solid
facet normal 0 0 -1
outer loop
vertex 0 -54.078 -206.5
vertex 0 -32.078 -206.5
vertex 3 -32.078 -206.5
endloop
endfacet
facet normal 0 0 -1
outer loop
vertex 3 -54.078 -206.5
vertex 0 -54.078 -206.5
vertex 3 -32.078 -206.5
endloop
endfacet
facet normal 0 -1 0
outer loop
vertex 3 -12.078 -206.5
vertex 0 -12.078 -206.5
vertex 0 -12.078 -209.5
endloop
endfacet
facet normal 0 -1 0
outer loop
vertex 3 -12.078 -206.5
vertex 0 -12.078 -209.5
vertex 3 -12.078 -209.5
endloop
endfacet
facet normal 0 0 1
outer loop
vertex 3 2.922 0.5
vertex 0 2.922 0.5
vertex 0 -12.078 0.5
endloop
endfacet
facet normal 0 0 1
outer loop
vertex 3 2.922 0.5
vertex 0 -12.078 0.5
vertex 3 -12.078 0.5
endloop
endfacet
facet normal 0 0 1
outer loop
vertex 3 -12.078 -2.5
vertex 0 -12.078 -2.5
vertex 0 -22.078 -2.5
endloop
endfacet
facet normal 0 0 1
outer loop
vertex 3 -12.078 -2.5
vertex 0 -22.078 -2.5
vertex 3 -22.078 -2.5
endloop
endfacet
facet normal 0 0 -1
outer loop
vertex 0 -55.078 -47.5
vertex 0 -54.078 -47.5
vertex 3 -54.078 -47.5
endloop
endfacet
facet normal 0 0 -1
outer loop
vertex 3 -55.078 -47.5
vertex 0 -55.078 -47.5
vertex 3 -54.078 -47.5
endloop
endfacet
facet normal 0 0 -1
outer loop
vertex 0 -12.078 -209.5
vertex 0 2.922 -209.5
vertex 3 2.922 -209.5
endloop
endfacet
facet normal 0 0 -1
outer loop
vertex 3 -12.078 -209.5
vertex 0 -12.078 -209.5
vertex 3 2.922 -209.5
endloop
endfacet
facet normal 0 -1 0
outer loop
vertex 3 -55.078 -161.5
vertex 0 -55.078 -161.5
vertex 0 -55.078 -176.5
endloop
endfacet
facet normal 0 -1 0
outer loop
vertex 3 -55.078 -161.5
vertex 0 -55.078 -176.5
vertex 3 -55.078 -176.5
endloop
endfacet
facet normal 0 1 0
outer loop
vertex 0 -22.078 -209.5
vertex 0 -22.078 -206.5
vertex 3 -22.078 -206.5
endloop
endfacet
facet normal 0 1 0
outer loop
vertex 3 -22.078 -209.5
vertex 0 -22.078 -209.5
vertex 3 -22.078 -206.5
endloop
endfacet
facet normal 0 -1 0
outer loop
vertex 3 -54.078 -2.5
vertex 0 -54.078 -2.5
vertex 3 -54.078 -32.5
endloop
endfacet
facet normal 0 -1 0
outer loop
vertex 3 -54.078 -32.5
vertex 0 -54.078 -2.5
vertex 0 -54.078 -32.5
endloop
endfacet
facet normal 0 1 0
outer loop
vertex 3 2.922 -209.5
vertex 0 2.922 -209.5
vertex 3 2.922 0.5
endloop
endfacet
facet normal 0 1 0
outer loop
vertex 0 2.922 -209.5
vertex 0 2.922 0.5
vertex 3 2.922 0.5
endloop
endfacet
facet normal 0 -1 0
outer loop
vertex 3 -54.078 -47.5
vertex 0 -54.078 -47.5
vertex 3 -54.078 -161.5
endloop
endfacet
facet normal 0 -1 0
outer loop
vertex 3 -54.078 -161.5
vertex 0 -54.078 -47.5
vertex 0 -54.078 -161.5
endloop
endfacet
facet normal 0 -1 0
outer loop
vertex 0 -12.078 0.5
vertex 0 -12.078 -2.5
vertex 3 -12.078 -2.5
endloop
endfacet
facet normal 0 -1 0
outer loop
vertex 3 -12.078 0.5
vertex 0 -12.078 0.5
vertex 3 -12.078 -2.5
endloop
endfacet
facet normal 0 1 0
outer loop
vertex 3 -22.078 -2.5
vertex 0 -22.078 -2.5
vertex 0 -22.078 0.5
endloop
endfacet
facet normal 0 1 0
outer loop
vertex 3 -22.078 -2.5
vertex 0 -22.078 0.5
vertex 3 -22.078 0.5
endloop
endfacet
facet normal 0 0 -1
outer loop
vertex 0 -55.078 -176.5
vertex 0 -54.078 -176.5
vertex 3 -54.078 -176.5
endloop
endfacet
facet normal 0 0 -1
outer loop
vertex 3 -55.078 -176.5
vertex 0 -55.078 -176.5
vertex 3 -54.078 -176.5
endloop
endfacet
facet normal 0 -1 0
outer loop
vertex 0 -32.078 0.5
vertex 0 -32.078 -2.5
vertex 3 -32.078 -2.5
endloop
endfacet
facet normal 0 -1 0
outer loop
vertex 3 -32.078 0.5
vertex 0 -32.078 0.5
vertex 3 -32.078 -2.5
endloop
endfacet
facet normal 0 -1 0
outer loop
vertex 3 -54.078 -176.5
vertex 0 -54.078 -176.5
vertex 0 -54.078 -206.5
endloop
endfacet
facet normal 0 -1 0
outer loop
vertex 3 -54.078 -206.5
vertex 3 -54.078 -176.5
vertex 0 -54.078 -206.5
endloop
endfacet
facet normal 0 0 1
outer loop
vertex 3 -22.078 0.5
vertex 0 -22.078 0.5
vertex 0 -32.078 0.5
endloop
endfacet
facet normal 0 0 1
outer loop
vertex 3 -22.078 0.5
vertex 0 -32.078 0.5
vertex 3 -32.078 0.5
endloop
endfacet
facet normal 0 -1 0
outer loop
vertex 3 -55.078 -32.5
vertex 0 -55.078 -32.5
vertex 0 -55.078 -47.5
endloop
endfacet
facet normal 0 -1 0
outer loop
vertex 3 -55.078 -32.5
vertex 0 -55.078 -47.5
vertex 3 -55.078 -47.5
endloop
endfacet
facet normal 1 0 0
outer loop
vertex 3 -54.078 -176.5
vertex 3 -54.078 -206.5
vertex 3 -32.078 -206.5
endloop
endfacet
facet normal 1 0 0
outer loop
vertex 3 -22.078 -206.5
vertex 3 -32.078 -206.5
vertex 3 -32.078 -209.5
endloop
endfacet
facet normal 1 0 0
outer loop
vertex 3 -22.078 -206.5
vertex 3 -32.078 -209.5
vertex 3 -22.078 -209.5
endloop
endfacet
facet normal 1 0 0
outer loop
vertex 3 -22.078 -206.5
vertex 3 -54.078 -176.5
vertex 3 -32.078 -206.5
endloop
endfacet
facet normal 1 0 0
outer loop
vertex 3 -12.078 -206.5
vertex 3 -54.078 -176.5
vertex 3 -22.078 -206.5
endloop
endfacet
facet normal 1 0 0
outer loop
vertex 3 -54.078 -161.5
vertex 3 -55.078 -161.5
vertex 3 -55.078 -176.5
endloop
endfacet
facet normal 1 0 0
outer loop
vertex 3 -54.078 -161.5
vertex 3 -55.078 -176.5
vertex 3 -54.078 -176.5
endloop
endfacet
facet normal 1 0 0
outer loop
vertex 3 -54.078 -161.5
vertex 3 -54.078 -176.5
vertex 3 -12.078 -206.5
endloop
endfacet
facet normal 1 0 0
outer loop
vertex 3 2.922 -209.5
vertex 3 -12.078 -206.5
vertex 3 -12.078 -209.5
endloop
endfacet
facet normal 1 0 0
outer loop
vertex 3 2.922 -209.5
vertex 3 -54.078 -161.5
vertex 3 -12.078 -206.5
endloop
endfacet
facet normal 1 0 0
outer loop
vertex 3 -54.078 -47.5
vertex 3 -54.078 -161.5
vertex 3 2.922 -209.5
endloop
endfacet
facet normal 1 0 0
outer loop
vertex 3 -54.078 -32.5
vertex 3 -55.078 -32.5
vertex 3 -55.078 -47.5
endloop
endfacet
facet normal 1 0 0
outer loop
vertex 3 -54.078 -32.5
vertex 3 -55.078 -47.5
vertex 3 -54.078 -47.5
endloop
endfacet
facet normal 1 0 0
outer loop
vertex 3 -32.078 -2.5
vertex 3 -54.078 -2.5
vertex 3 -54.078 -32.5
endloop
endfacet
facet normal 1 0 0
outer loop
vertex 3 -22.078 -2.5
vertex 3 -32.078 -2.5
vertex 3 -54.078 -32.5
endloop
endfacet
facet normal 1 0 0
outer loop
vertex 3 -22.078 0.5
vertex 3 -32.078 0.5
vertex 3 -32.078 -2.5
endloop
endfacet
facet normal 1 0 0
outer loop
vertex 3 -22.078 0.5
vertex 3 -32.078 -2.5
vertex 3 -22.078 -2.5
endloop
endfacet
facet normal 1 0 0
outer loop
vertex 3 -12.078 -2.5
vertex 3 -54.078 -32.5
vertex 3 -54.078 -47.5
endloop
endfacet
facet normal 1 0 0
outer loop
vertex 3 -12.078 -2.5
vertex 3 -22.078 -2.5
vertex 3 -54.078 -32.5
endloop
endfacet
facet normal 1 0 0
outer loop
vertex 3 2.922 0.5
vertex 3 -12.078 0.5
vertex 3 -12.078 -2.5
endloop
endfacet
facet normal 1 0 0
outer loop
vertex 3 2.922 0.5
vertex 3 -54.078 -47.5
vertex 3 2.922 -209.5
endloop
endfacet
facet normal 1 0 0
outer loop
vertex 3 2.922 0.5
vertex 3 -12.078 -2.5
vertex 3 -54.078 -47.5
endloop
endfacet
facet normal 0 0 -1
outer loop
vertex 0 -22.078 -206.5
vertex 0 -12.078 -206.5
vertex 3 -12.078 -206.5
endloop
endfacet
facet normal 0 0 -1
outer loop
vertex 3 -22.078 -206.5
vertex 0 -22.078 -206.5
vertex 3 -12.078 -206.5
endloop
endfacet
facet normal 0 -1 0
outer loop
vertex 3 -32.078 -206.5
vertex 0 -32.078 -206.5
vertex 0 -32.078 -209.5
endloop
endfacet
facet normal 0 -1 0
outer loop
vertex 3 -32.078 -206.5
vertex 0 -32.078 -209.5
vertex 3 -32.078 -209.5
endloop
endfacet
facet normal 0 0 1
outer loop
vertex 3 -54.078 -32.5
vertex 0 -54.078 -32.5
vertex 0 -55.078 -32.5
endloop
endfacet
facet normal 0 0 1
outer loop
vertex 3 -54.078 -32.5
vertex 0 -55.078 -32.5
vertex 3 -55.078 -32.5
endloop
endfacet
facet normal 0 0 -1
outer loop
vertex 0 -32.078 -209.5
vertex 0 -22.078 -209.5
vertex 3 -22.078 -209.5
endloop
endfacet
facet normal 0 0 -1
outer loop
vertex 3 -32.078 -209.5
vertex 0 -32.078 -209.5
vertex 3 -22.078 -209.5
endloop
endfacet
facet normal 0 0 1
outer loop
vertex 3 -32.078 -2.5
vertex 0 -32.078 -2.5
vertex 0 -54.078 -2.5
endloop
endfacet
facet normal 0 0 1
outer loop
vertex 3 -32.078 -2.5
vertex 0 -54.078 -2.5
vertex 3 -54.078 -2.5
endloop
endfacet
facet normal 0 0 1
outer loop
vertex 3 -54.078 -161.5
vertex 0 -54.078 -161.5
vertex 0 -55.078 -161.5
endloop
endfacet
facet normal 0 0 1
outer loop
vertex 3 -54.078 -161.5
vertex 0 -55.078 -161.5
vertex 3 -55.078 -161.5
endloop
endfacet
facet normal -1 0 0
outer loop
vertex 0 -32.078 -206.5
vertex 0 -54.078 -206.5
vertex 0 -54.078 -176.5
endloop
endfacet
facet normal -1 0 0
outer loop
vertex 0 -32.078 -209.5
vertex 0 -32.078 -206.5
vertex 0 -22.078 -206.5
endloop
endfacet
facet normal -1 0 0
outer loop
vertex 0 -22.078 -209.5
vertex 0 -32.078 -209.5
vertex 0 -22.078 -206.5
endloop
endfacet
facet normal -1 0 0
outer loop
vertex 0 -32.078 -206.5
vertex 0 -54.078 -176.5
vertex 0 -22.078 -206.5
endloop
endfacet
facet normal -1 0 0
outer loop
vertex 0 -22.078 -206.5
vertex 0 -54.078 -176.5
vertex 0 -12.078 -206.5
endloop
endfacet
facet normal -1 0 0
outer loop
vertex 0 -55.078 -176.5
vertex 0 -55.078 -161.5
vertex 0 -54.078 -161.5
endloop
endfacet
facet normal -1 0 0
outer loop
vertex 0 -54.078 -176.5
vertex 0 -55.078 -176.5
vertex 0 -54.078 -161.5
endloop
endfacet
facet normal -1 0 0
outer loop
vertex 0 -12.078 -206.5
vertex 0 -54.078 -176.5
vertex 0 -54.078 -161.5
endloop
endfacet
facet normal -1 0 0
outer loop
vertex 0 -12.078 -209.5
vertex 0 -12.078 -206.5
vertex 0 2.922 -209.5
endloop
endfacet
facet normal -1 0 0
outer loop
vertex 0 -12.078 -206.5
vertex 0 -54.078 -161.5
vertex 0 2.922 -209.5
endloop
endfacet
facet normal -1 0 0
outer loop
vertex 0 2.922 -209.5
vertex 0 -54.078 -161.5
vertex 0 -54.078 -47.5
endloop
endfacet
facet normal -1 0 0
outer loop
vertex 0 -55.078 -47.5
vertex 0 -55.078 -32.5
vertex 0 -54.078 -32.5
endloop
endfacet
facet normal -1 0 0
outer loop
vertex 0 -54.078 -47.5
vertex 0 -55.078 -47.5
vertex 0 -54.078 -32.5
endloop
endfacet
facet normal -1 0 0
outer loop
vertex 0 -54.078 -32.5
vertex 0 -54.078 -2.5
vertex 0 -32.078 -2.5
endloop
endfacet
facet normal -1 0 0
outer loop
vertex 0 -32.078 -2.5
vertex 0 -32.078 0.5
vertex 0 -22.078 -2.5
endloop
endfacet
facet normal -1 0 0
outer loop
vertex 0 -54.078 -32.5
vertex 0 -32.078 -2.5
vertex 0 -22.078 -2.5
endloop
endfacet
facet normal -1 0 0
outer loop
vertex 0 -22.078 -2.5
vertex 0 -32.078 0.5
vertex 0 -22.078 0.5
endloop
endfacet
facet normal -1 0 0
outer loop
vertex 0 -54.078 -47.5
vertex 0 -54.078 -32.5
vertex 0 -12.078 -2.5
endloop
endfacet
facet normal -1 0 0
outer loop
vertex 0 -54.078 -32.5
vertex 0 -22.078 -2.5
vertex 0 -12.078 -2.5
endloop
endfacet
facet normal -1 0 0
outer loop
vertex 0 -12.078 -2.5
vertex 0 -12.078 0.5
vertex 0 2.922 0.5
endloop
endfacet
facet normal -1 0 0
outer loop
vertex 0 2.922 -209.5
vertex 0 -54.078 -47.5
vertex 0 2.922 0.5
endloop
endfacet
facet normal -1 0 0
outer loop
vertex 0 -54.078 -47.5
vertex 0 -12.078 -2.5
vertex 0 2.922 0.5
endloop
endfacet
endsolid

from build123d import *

# Parameters (mm, degrees)
EXTRUDE_1_DEPTH          = 0.5
EXTRUDE_2_DEPTH          = 104.5
SKETCH_8_W               = 60
SKETCH_8_H               = 8
SKETCH_8_W_2             = 60.005961803
CUT_EXTRUDE_2_DEPTH      = 10
CUT_EXTRUDE_3_DEPTH      = 10
EXTRUDE_4_DEPTH          = 2.5
FILLET_3_R               = 0.25
FILLET_4_R               = 0.25
SKETCH_7_R               = 3.5
SKETCH_7_R_2             = 0.5
CUT_EXTRUDE_4_DEPTH      = 244
SKETCH_11_W              = 182.233952392
SKETCH_11_H              = 62.441724199
CUT_EXTRUDE_5_DEPTH      = 3
SKETCH_12_W              = 153.34351729
SKETCH_12_H              = 66.332199781
CUT_EXTRUDE_6_DEPTH      = 3
CUT_EXTRUDE_7_DEPTH      = 164
CUT_EXTRUDE_7_DEPTH_BACK = 90
SKETCH_13_W              = 225.919069127
SKETCH_13_H              = 66.171542843
SKETCH_14_W              = 3
SKETCH_14_H              = 15
EXTRUDE_5_DEPTH          = 1
SKETCH_18_W              = 3
SKETCH_18_H              = 204
EXTRUDE_6_DEPTH          = 4
SKETCH_19_W              = 3
SKETCH_19_H              = 15
SKETCH_19_H_2            = 10
EXTRUDE_7_DEPTH          = 3


with BuildPart() as part:
    # 草图1 → 凸台-拉伸1 (new body)
    with BuildSketch(Plane.XY):
        Polygon((0, -1.078212291), (0, -59.078212291), (150, -59.078212291), (150, -56.078212291), (24.720670391, -21.433997855), (24.720670391, -1.078212291), align=None)
    extrude(amount=EXTRUDE_1_DEPTH)

    # 草图2 → 凸台-拉伸2 (add)
    with BuildSketch(Plane(origin=(0, 0, 0), x_dir=(-1, 0, 0), z_dir=(0, 0, -1))):
        with BuildLine():
            Line((0, -1.078212291), (-3, -1.078212291))
            Line((-3, -1.078212291), (-3, -54.078212291))
            Line((-3, -54.078212291), (-149.757649478, -58.570793397))
            ThreePointArc((-149.757649478, -58.570793397), (-149.929460817, -58.646625155), (-150, -58.820676341))
            Line((-150, -58.820676341), (-150, -58.828212291))
            ThreePointArc((-150, -58.828212291), (-149.926776695, -59.004988986), (-149.75, -59.078212291))
            Line((-149.75, -59.078212291), (0, -59.078212291))
            Line((0, -59.078212291), (0, -1.078212291))
        make_face()
    extrude(amount=EXTRUDE_2_DEPTH)

    # 镜向3: part across plane


with BuildPart() as part_1:
    add(part.part)
    add(part.part.mirror(Plane(origin=(149.75, -58.820676341, -104.5), x_dir=(1, 0, 0), z_dir=(0, 0, 1))))

    # 草图8 → 切除-拉伸2 (cut)
    with BuildSketch(Plane(origin=(-1.651096891, -53.935831773, 0), x_dir=(0.9995317742895511, -0.03059791145784333, 0), z_dir=(0.03059791145784333, 0.9995317742895511, 0))):
        with Locations((121.479673046, 5)):
            Rectangle(SKETCH_8_W, SKETCH_8_H)
        with Locations((121.476692145, 15)):
            Rectangle(SKETCH_8_W_2, SKETCH_8_H)
        with Locations((121.476692145, 24.421052632)):
            Rectangle(SKETCH_8_W_2, SKETCH_8_H)
        with Locations((121.476692145, 33.842105263)):
            Rectangle(SKETCH_8_W_2, SKETCH_8_H)
        with Locations((121.476692145, 43.263157895)):
            Rectangle(SKETCH_8_W_2, SKETCH_8_H)
        with Locations((121.476692145, 52.684210526)):
            Rectangle(SKETCH_8_W_2, SKETCH_8_H)
        with Locations((121.476692145, 62.105263158)):
            Rectangle(SKETCH_8_W_2, SKETCH_8_H)
        with Locations((121.476692145, 71.526315789)):
            Rectangle(SKETCH_8_W_2, SKETCH_8_H)
        with Locations((121.476692145, 80.947368421)):
            Rectangle(SKETCH_8_W_2, SKETCH_8_H)
        with Locations((121.476692145, 90.368421053)):
            Rectangle(SKETCH_8_W_2, SKETCH_8_H)
        with Locations((121.476692145, 99.789473684)):
            Rectangle(SKETCH_8_W_2, SKETCH_8_H)
        with Locations((121.476692145, 109.210526316)):
            Rectangle(SKETCH_8_W_2, SKETCH_8_H)
        with Locations((121.476692145, 118.631578947)):
            Rectangle(SKETCH_8_W_2, SKETCH_8_H)
        with Locations((121.476692145, 128.052631579)):
            Rectangle(SKETCH_8_W_2, SKETCH_8_H)
        with Locations((121.476692145, 137.473684211)):
            Rectangle(SKETCH_8_W_2, SKETCH_8_H)
        with Locations((121.476692145, 146.894736842)):
            Rectangle(SKETCH_8_W_2, SKETCH_8_H)
        with Locations((121.476692145, 156.315789474)):
            Rectangle(SKETCH_8_W_2, SKETCH_8_H)
        with Locations((121.476692145, 165.736842105)):
            Rectangle(SKETCH_8_W_2, SKETCH_8_H)
        with Locations((121.476692145, 175.157894737)):
            Rectangle(SKETCH_8_W_2, SKETCH_8_H)
        with Locations((121.476692145, 184.578947368)):
            Rectangle(SKETCH_8_W_2, SKETCH_8_H)
        with Locations((121.476692145, 194)):
            Rectangle(SKETCH_8_W_2, SKETCH_8_H)
        with Locations((121.479673046, 204)):
            Rectangle(SKETCH_8_W, SKETCH_8_H)
    extrude(amount=-CUT_EXTRUDE_2_DEPTH, mode=Mode.SUBTRACT)

    # 草图9 → 切除-拉伸3 (cut)
    with BuildSketch(Plane(origin=(-1.651096891, -53.935831773, 0), x_dir=(0.9995317742895511, -0.03059791145784333, 0), z_dir=(0.03059791145784333, 0.9995317742895511, 0))):
        Polygon((151.645642318, 209), (153.085665737, 209), (154.855962757, 1), (151.716207414, 1), (151.479673046, 1), (151.479673046, 209), align=None)
    extrude(amount=-CUT_EXTRUDE_3_DEPTH, mode=Mode.SUBTRACT)

    # 草图1<3> → 凸台-拉伸4 (add)
    with BuildSketch(Plane.XY):
        Polygon((0, -1.078212291), (0, -59.078212291), (150, -59.078212291), (150, -56.078212291), (24.720670391, -21.433997855), (24.720670391, -1.078212291), align=None)
    extrude_4 = extrude(amount=-EXTRUDE_4_DEPTH)

    # 圆角3
    fillet_3_edges = [part_1.edges().sort_by_distance(p)[0] for p in [
        (149.757649478, -58.570793397, -170.447368421),
        (149.757649478, -58.570793397, -179.868421053),
        (149.757649478, -58.570793397, -189.289473684),
        (149.757649478, -58.570793397, -199),
        (149.757649478, -58.570793397, -208.5),
        (149.757649478, -58.570793397, -85.657894737),
        (149.757649478, -58.570793397, -95.078947368),
        (149.757649478, -58.570793397, -104.5),
        (149.757649478, -58.570793397, -113.921052632),
        (149.757649478, -58.570793397, -123.342105263),
        (149.757649478, -58.570793397, -132.763157895),
        (149.757649478, -58.570793397, -142.184210526),
        (149.757649478, -58.570793397, -151.605263158),
        (149.757649478, -58.570793397, -161.026315789),
        (149.757649478, -58.570793397, -76.236842105),
        (149.757649478, -58.570793397, -66.815789474),
        (149.757649478, -58.570793397, -57.394736842),
        (149.757649478, -58.570793397, -47.973684211),
        (149.757649478, -58.570793397, -38.552631579),
        (149.757649478, -58.570793397, -29.131578947),
        (149.757649478, -58.570793397, -19.710526316),
        (149.757649478, -58.570793397, -10),
    ]]
    fillet(fillet_3_edges, radius=FILLET_3_R)

    # 圆角4
    fillet_4_edges = [part_1.edges().sort_by_distance(p)[0] for p in [
        (149.742116246, -59.078212291, -47.973684211),
        (149.742116246, -59.078212291, -38.552631579),
        (149.742116246, -59.078212291, -29.131578947),
        (149.742116246, -59.078212291, -19.710526316),
        (149.742116246, -59.078212291, -10),
        (149.742116246, -59.078212291, -66.815789474),
        (149.742116246, -59.078212291, -57.394736842),
        (149.742116246, -59.078212291, -85.657894737),
        (149.742116246, -59.078212291, -76.236842105),
        (149.742116246, -59.078212291, -123.342105263),
        (149.742116246, -59.078212291, -113.921052632),
        (149.742116246, -59.078212291, -104.5),
        (149.742116246, -59.078212291, -95.078947368),
        (149.742116246, -59.078212291, -132.763157895),
        (149.742116246, -59.078212291, -142.184210526),
        (149.742116246, -59.078212291, -151.605263158),
        (149.742116246, -59.078212291, -161.026315789),
        (149.742116246, -59.078212291, -208.5),
        (149.742116246, -59.078212291, -199),
        (149.742116246, -59.078212291, -189.289473684),
        (149.742116246, -59.078212291, -179.868421053),
        (149.742116246, -59.078212291, -170.447368421),
    ]]
    fillet(fillet_4_edges, radius=FILLET_4_R)

    # 镜向4: 凸台-拉伸4 across plane
    add(extrude_4.mirror(Plane(origin=(0, 0, -104.5), x_dir=(1, 0, 0), z_dir=(0, 0, -1))))

    # 草图7 → 切除-拉伸4 (cut)
    with BuildSketch(Plane.XY.offset(0.5)):
        with Locations((8, -45.078212291)):
            Circle(SKETCH_7_R)
        with Locations((25, -45.078212291)):
            Circle(SKETCH_7_R_2)
        with Locations((23, -45.078212291)):
            Circle(SKETCH_7_R_2)
    extrude(amount=-CUT_EXTRUDE_4_DEPTH, mode=Mode.SUBTRACT)

    # 草图11 → 切除-拉伸5 (cut)
    with BuildSketch(Plane.XY.offset(0.5)):
        with Locations((91.116976196, -27.857350192)):
            Rectangle(SKETCH_11_W, SKETCH_11_H)
    extrude(amount=-CUT_EXTRUDE_5_DEPTH, mode=Mode.SUBTRACT)

    # 草图12 → 切除-拉伸6 (cut)
    with BuildSketch(Plane(origin=(0, 0, -209.5), x_dir=(-1, 0, 0), z_dir=(0, 0, -1))):
        with Locations((-76.671758645, -25.912112401)):
            Rectangle(SKETCH_12_W, SKETCH_12_H)
    extrude(amount=-CUT_EXTRUDE_6_DEPTH, mode=Mode.SUBTRACT)

    # 草图13 → 切除-拉伸7 (cut, two sides: drawn at the far end of the back side and taken through both)
    with BuildSketch(Plane(origin=(3, 0, 0), x_dir=(0, 0, -1), z_dir=(1, 0, 0)).offset(-CUT_EXTRUDE_7_DEPTH_BACK)):
        with Locations((115.459534564, -87.163983712)):
            Rectangle(SKETCH_13_W, SKETCH_13_H)
    extrude(amount=CUT_EXTRUDE_7_DEPTH + CUT_EXTRUDE_7_DEPTH_BACK, mode=Mode.SUBTRACT)

    # 草图14 → 凸台-拉伸5 (add)
    with BuildSketch(Plane.XZ.offset(54.078212291)):
        with Locations((1.5, -40)):
            Rectangle(SKETCH_14_W, SKETCH_14_H)
        with Locations((1.5, -169)):
            Rectangle(SKETCH_14_W, SKETCH_14_H)
    extrude(amount=EXTRUDE_5_DEPTH)

    # 草图18 → 凸台-拉伸6 (add)
    with BuildSketch(Plane(origin=(0, -1.078212291, 0), x_dir=(1, 0, 0), z_dir=(0, 1, 0))):
        with Locations((1.5, 104.5)):
            Rectangle(SKETCH_18_W, SKETCH_18_H)
    extrude(amount=EXTRUDE_6_DEPTH)

    # 草图19 → 凸台-拉伸7 (add)
    with BuildSketch(Plane.XY.offset(-2.5)):
        with Locations((1.5, -4.578212291)):
            Rectangle(SKETCH_19_W, SKETCH_19_H)
        with Locations((1.5, -27.078212291)):
            Rectangle(SKETCH_19_W, SKETCH_19_H_2)
    extrude_7 = extrude(amount=EXTRUDE_7_DEPTH)

    # 镜向5: 凸台-拉伸7 across plane
    add(extrude_7.mirror(Plane(origin=(0, 0, -104.5), x_dir=(1, 0, 0), z_dir=(0, 0, -1))))


solid = part_1.part
